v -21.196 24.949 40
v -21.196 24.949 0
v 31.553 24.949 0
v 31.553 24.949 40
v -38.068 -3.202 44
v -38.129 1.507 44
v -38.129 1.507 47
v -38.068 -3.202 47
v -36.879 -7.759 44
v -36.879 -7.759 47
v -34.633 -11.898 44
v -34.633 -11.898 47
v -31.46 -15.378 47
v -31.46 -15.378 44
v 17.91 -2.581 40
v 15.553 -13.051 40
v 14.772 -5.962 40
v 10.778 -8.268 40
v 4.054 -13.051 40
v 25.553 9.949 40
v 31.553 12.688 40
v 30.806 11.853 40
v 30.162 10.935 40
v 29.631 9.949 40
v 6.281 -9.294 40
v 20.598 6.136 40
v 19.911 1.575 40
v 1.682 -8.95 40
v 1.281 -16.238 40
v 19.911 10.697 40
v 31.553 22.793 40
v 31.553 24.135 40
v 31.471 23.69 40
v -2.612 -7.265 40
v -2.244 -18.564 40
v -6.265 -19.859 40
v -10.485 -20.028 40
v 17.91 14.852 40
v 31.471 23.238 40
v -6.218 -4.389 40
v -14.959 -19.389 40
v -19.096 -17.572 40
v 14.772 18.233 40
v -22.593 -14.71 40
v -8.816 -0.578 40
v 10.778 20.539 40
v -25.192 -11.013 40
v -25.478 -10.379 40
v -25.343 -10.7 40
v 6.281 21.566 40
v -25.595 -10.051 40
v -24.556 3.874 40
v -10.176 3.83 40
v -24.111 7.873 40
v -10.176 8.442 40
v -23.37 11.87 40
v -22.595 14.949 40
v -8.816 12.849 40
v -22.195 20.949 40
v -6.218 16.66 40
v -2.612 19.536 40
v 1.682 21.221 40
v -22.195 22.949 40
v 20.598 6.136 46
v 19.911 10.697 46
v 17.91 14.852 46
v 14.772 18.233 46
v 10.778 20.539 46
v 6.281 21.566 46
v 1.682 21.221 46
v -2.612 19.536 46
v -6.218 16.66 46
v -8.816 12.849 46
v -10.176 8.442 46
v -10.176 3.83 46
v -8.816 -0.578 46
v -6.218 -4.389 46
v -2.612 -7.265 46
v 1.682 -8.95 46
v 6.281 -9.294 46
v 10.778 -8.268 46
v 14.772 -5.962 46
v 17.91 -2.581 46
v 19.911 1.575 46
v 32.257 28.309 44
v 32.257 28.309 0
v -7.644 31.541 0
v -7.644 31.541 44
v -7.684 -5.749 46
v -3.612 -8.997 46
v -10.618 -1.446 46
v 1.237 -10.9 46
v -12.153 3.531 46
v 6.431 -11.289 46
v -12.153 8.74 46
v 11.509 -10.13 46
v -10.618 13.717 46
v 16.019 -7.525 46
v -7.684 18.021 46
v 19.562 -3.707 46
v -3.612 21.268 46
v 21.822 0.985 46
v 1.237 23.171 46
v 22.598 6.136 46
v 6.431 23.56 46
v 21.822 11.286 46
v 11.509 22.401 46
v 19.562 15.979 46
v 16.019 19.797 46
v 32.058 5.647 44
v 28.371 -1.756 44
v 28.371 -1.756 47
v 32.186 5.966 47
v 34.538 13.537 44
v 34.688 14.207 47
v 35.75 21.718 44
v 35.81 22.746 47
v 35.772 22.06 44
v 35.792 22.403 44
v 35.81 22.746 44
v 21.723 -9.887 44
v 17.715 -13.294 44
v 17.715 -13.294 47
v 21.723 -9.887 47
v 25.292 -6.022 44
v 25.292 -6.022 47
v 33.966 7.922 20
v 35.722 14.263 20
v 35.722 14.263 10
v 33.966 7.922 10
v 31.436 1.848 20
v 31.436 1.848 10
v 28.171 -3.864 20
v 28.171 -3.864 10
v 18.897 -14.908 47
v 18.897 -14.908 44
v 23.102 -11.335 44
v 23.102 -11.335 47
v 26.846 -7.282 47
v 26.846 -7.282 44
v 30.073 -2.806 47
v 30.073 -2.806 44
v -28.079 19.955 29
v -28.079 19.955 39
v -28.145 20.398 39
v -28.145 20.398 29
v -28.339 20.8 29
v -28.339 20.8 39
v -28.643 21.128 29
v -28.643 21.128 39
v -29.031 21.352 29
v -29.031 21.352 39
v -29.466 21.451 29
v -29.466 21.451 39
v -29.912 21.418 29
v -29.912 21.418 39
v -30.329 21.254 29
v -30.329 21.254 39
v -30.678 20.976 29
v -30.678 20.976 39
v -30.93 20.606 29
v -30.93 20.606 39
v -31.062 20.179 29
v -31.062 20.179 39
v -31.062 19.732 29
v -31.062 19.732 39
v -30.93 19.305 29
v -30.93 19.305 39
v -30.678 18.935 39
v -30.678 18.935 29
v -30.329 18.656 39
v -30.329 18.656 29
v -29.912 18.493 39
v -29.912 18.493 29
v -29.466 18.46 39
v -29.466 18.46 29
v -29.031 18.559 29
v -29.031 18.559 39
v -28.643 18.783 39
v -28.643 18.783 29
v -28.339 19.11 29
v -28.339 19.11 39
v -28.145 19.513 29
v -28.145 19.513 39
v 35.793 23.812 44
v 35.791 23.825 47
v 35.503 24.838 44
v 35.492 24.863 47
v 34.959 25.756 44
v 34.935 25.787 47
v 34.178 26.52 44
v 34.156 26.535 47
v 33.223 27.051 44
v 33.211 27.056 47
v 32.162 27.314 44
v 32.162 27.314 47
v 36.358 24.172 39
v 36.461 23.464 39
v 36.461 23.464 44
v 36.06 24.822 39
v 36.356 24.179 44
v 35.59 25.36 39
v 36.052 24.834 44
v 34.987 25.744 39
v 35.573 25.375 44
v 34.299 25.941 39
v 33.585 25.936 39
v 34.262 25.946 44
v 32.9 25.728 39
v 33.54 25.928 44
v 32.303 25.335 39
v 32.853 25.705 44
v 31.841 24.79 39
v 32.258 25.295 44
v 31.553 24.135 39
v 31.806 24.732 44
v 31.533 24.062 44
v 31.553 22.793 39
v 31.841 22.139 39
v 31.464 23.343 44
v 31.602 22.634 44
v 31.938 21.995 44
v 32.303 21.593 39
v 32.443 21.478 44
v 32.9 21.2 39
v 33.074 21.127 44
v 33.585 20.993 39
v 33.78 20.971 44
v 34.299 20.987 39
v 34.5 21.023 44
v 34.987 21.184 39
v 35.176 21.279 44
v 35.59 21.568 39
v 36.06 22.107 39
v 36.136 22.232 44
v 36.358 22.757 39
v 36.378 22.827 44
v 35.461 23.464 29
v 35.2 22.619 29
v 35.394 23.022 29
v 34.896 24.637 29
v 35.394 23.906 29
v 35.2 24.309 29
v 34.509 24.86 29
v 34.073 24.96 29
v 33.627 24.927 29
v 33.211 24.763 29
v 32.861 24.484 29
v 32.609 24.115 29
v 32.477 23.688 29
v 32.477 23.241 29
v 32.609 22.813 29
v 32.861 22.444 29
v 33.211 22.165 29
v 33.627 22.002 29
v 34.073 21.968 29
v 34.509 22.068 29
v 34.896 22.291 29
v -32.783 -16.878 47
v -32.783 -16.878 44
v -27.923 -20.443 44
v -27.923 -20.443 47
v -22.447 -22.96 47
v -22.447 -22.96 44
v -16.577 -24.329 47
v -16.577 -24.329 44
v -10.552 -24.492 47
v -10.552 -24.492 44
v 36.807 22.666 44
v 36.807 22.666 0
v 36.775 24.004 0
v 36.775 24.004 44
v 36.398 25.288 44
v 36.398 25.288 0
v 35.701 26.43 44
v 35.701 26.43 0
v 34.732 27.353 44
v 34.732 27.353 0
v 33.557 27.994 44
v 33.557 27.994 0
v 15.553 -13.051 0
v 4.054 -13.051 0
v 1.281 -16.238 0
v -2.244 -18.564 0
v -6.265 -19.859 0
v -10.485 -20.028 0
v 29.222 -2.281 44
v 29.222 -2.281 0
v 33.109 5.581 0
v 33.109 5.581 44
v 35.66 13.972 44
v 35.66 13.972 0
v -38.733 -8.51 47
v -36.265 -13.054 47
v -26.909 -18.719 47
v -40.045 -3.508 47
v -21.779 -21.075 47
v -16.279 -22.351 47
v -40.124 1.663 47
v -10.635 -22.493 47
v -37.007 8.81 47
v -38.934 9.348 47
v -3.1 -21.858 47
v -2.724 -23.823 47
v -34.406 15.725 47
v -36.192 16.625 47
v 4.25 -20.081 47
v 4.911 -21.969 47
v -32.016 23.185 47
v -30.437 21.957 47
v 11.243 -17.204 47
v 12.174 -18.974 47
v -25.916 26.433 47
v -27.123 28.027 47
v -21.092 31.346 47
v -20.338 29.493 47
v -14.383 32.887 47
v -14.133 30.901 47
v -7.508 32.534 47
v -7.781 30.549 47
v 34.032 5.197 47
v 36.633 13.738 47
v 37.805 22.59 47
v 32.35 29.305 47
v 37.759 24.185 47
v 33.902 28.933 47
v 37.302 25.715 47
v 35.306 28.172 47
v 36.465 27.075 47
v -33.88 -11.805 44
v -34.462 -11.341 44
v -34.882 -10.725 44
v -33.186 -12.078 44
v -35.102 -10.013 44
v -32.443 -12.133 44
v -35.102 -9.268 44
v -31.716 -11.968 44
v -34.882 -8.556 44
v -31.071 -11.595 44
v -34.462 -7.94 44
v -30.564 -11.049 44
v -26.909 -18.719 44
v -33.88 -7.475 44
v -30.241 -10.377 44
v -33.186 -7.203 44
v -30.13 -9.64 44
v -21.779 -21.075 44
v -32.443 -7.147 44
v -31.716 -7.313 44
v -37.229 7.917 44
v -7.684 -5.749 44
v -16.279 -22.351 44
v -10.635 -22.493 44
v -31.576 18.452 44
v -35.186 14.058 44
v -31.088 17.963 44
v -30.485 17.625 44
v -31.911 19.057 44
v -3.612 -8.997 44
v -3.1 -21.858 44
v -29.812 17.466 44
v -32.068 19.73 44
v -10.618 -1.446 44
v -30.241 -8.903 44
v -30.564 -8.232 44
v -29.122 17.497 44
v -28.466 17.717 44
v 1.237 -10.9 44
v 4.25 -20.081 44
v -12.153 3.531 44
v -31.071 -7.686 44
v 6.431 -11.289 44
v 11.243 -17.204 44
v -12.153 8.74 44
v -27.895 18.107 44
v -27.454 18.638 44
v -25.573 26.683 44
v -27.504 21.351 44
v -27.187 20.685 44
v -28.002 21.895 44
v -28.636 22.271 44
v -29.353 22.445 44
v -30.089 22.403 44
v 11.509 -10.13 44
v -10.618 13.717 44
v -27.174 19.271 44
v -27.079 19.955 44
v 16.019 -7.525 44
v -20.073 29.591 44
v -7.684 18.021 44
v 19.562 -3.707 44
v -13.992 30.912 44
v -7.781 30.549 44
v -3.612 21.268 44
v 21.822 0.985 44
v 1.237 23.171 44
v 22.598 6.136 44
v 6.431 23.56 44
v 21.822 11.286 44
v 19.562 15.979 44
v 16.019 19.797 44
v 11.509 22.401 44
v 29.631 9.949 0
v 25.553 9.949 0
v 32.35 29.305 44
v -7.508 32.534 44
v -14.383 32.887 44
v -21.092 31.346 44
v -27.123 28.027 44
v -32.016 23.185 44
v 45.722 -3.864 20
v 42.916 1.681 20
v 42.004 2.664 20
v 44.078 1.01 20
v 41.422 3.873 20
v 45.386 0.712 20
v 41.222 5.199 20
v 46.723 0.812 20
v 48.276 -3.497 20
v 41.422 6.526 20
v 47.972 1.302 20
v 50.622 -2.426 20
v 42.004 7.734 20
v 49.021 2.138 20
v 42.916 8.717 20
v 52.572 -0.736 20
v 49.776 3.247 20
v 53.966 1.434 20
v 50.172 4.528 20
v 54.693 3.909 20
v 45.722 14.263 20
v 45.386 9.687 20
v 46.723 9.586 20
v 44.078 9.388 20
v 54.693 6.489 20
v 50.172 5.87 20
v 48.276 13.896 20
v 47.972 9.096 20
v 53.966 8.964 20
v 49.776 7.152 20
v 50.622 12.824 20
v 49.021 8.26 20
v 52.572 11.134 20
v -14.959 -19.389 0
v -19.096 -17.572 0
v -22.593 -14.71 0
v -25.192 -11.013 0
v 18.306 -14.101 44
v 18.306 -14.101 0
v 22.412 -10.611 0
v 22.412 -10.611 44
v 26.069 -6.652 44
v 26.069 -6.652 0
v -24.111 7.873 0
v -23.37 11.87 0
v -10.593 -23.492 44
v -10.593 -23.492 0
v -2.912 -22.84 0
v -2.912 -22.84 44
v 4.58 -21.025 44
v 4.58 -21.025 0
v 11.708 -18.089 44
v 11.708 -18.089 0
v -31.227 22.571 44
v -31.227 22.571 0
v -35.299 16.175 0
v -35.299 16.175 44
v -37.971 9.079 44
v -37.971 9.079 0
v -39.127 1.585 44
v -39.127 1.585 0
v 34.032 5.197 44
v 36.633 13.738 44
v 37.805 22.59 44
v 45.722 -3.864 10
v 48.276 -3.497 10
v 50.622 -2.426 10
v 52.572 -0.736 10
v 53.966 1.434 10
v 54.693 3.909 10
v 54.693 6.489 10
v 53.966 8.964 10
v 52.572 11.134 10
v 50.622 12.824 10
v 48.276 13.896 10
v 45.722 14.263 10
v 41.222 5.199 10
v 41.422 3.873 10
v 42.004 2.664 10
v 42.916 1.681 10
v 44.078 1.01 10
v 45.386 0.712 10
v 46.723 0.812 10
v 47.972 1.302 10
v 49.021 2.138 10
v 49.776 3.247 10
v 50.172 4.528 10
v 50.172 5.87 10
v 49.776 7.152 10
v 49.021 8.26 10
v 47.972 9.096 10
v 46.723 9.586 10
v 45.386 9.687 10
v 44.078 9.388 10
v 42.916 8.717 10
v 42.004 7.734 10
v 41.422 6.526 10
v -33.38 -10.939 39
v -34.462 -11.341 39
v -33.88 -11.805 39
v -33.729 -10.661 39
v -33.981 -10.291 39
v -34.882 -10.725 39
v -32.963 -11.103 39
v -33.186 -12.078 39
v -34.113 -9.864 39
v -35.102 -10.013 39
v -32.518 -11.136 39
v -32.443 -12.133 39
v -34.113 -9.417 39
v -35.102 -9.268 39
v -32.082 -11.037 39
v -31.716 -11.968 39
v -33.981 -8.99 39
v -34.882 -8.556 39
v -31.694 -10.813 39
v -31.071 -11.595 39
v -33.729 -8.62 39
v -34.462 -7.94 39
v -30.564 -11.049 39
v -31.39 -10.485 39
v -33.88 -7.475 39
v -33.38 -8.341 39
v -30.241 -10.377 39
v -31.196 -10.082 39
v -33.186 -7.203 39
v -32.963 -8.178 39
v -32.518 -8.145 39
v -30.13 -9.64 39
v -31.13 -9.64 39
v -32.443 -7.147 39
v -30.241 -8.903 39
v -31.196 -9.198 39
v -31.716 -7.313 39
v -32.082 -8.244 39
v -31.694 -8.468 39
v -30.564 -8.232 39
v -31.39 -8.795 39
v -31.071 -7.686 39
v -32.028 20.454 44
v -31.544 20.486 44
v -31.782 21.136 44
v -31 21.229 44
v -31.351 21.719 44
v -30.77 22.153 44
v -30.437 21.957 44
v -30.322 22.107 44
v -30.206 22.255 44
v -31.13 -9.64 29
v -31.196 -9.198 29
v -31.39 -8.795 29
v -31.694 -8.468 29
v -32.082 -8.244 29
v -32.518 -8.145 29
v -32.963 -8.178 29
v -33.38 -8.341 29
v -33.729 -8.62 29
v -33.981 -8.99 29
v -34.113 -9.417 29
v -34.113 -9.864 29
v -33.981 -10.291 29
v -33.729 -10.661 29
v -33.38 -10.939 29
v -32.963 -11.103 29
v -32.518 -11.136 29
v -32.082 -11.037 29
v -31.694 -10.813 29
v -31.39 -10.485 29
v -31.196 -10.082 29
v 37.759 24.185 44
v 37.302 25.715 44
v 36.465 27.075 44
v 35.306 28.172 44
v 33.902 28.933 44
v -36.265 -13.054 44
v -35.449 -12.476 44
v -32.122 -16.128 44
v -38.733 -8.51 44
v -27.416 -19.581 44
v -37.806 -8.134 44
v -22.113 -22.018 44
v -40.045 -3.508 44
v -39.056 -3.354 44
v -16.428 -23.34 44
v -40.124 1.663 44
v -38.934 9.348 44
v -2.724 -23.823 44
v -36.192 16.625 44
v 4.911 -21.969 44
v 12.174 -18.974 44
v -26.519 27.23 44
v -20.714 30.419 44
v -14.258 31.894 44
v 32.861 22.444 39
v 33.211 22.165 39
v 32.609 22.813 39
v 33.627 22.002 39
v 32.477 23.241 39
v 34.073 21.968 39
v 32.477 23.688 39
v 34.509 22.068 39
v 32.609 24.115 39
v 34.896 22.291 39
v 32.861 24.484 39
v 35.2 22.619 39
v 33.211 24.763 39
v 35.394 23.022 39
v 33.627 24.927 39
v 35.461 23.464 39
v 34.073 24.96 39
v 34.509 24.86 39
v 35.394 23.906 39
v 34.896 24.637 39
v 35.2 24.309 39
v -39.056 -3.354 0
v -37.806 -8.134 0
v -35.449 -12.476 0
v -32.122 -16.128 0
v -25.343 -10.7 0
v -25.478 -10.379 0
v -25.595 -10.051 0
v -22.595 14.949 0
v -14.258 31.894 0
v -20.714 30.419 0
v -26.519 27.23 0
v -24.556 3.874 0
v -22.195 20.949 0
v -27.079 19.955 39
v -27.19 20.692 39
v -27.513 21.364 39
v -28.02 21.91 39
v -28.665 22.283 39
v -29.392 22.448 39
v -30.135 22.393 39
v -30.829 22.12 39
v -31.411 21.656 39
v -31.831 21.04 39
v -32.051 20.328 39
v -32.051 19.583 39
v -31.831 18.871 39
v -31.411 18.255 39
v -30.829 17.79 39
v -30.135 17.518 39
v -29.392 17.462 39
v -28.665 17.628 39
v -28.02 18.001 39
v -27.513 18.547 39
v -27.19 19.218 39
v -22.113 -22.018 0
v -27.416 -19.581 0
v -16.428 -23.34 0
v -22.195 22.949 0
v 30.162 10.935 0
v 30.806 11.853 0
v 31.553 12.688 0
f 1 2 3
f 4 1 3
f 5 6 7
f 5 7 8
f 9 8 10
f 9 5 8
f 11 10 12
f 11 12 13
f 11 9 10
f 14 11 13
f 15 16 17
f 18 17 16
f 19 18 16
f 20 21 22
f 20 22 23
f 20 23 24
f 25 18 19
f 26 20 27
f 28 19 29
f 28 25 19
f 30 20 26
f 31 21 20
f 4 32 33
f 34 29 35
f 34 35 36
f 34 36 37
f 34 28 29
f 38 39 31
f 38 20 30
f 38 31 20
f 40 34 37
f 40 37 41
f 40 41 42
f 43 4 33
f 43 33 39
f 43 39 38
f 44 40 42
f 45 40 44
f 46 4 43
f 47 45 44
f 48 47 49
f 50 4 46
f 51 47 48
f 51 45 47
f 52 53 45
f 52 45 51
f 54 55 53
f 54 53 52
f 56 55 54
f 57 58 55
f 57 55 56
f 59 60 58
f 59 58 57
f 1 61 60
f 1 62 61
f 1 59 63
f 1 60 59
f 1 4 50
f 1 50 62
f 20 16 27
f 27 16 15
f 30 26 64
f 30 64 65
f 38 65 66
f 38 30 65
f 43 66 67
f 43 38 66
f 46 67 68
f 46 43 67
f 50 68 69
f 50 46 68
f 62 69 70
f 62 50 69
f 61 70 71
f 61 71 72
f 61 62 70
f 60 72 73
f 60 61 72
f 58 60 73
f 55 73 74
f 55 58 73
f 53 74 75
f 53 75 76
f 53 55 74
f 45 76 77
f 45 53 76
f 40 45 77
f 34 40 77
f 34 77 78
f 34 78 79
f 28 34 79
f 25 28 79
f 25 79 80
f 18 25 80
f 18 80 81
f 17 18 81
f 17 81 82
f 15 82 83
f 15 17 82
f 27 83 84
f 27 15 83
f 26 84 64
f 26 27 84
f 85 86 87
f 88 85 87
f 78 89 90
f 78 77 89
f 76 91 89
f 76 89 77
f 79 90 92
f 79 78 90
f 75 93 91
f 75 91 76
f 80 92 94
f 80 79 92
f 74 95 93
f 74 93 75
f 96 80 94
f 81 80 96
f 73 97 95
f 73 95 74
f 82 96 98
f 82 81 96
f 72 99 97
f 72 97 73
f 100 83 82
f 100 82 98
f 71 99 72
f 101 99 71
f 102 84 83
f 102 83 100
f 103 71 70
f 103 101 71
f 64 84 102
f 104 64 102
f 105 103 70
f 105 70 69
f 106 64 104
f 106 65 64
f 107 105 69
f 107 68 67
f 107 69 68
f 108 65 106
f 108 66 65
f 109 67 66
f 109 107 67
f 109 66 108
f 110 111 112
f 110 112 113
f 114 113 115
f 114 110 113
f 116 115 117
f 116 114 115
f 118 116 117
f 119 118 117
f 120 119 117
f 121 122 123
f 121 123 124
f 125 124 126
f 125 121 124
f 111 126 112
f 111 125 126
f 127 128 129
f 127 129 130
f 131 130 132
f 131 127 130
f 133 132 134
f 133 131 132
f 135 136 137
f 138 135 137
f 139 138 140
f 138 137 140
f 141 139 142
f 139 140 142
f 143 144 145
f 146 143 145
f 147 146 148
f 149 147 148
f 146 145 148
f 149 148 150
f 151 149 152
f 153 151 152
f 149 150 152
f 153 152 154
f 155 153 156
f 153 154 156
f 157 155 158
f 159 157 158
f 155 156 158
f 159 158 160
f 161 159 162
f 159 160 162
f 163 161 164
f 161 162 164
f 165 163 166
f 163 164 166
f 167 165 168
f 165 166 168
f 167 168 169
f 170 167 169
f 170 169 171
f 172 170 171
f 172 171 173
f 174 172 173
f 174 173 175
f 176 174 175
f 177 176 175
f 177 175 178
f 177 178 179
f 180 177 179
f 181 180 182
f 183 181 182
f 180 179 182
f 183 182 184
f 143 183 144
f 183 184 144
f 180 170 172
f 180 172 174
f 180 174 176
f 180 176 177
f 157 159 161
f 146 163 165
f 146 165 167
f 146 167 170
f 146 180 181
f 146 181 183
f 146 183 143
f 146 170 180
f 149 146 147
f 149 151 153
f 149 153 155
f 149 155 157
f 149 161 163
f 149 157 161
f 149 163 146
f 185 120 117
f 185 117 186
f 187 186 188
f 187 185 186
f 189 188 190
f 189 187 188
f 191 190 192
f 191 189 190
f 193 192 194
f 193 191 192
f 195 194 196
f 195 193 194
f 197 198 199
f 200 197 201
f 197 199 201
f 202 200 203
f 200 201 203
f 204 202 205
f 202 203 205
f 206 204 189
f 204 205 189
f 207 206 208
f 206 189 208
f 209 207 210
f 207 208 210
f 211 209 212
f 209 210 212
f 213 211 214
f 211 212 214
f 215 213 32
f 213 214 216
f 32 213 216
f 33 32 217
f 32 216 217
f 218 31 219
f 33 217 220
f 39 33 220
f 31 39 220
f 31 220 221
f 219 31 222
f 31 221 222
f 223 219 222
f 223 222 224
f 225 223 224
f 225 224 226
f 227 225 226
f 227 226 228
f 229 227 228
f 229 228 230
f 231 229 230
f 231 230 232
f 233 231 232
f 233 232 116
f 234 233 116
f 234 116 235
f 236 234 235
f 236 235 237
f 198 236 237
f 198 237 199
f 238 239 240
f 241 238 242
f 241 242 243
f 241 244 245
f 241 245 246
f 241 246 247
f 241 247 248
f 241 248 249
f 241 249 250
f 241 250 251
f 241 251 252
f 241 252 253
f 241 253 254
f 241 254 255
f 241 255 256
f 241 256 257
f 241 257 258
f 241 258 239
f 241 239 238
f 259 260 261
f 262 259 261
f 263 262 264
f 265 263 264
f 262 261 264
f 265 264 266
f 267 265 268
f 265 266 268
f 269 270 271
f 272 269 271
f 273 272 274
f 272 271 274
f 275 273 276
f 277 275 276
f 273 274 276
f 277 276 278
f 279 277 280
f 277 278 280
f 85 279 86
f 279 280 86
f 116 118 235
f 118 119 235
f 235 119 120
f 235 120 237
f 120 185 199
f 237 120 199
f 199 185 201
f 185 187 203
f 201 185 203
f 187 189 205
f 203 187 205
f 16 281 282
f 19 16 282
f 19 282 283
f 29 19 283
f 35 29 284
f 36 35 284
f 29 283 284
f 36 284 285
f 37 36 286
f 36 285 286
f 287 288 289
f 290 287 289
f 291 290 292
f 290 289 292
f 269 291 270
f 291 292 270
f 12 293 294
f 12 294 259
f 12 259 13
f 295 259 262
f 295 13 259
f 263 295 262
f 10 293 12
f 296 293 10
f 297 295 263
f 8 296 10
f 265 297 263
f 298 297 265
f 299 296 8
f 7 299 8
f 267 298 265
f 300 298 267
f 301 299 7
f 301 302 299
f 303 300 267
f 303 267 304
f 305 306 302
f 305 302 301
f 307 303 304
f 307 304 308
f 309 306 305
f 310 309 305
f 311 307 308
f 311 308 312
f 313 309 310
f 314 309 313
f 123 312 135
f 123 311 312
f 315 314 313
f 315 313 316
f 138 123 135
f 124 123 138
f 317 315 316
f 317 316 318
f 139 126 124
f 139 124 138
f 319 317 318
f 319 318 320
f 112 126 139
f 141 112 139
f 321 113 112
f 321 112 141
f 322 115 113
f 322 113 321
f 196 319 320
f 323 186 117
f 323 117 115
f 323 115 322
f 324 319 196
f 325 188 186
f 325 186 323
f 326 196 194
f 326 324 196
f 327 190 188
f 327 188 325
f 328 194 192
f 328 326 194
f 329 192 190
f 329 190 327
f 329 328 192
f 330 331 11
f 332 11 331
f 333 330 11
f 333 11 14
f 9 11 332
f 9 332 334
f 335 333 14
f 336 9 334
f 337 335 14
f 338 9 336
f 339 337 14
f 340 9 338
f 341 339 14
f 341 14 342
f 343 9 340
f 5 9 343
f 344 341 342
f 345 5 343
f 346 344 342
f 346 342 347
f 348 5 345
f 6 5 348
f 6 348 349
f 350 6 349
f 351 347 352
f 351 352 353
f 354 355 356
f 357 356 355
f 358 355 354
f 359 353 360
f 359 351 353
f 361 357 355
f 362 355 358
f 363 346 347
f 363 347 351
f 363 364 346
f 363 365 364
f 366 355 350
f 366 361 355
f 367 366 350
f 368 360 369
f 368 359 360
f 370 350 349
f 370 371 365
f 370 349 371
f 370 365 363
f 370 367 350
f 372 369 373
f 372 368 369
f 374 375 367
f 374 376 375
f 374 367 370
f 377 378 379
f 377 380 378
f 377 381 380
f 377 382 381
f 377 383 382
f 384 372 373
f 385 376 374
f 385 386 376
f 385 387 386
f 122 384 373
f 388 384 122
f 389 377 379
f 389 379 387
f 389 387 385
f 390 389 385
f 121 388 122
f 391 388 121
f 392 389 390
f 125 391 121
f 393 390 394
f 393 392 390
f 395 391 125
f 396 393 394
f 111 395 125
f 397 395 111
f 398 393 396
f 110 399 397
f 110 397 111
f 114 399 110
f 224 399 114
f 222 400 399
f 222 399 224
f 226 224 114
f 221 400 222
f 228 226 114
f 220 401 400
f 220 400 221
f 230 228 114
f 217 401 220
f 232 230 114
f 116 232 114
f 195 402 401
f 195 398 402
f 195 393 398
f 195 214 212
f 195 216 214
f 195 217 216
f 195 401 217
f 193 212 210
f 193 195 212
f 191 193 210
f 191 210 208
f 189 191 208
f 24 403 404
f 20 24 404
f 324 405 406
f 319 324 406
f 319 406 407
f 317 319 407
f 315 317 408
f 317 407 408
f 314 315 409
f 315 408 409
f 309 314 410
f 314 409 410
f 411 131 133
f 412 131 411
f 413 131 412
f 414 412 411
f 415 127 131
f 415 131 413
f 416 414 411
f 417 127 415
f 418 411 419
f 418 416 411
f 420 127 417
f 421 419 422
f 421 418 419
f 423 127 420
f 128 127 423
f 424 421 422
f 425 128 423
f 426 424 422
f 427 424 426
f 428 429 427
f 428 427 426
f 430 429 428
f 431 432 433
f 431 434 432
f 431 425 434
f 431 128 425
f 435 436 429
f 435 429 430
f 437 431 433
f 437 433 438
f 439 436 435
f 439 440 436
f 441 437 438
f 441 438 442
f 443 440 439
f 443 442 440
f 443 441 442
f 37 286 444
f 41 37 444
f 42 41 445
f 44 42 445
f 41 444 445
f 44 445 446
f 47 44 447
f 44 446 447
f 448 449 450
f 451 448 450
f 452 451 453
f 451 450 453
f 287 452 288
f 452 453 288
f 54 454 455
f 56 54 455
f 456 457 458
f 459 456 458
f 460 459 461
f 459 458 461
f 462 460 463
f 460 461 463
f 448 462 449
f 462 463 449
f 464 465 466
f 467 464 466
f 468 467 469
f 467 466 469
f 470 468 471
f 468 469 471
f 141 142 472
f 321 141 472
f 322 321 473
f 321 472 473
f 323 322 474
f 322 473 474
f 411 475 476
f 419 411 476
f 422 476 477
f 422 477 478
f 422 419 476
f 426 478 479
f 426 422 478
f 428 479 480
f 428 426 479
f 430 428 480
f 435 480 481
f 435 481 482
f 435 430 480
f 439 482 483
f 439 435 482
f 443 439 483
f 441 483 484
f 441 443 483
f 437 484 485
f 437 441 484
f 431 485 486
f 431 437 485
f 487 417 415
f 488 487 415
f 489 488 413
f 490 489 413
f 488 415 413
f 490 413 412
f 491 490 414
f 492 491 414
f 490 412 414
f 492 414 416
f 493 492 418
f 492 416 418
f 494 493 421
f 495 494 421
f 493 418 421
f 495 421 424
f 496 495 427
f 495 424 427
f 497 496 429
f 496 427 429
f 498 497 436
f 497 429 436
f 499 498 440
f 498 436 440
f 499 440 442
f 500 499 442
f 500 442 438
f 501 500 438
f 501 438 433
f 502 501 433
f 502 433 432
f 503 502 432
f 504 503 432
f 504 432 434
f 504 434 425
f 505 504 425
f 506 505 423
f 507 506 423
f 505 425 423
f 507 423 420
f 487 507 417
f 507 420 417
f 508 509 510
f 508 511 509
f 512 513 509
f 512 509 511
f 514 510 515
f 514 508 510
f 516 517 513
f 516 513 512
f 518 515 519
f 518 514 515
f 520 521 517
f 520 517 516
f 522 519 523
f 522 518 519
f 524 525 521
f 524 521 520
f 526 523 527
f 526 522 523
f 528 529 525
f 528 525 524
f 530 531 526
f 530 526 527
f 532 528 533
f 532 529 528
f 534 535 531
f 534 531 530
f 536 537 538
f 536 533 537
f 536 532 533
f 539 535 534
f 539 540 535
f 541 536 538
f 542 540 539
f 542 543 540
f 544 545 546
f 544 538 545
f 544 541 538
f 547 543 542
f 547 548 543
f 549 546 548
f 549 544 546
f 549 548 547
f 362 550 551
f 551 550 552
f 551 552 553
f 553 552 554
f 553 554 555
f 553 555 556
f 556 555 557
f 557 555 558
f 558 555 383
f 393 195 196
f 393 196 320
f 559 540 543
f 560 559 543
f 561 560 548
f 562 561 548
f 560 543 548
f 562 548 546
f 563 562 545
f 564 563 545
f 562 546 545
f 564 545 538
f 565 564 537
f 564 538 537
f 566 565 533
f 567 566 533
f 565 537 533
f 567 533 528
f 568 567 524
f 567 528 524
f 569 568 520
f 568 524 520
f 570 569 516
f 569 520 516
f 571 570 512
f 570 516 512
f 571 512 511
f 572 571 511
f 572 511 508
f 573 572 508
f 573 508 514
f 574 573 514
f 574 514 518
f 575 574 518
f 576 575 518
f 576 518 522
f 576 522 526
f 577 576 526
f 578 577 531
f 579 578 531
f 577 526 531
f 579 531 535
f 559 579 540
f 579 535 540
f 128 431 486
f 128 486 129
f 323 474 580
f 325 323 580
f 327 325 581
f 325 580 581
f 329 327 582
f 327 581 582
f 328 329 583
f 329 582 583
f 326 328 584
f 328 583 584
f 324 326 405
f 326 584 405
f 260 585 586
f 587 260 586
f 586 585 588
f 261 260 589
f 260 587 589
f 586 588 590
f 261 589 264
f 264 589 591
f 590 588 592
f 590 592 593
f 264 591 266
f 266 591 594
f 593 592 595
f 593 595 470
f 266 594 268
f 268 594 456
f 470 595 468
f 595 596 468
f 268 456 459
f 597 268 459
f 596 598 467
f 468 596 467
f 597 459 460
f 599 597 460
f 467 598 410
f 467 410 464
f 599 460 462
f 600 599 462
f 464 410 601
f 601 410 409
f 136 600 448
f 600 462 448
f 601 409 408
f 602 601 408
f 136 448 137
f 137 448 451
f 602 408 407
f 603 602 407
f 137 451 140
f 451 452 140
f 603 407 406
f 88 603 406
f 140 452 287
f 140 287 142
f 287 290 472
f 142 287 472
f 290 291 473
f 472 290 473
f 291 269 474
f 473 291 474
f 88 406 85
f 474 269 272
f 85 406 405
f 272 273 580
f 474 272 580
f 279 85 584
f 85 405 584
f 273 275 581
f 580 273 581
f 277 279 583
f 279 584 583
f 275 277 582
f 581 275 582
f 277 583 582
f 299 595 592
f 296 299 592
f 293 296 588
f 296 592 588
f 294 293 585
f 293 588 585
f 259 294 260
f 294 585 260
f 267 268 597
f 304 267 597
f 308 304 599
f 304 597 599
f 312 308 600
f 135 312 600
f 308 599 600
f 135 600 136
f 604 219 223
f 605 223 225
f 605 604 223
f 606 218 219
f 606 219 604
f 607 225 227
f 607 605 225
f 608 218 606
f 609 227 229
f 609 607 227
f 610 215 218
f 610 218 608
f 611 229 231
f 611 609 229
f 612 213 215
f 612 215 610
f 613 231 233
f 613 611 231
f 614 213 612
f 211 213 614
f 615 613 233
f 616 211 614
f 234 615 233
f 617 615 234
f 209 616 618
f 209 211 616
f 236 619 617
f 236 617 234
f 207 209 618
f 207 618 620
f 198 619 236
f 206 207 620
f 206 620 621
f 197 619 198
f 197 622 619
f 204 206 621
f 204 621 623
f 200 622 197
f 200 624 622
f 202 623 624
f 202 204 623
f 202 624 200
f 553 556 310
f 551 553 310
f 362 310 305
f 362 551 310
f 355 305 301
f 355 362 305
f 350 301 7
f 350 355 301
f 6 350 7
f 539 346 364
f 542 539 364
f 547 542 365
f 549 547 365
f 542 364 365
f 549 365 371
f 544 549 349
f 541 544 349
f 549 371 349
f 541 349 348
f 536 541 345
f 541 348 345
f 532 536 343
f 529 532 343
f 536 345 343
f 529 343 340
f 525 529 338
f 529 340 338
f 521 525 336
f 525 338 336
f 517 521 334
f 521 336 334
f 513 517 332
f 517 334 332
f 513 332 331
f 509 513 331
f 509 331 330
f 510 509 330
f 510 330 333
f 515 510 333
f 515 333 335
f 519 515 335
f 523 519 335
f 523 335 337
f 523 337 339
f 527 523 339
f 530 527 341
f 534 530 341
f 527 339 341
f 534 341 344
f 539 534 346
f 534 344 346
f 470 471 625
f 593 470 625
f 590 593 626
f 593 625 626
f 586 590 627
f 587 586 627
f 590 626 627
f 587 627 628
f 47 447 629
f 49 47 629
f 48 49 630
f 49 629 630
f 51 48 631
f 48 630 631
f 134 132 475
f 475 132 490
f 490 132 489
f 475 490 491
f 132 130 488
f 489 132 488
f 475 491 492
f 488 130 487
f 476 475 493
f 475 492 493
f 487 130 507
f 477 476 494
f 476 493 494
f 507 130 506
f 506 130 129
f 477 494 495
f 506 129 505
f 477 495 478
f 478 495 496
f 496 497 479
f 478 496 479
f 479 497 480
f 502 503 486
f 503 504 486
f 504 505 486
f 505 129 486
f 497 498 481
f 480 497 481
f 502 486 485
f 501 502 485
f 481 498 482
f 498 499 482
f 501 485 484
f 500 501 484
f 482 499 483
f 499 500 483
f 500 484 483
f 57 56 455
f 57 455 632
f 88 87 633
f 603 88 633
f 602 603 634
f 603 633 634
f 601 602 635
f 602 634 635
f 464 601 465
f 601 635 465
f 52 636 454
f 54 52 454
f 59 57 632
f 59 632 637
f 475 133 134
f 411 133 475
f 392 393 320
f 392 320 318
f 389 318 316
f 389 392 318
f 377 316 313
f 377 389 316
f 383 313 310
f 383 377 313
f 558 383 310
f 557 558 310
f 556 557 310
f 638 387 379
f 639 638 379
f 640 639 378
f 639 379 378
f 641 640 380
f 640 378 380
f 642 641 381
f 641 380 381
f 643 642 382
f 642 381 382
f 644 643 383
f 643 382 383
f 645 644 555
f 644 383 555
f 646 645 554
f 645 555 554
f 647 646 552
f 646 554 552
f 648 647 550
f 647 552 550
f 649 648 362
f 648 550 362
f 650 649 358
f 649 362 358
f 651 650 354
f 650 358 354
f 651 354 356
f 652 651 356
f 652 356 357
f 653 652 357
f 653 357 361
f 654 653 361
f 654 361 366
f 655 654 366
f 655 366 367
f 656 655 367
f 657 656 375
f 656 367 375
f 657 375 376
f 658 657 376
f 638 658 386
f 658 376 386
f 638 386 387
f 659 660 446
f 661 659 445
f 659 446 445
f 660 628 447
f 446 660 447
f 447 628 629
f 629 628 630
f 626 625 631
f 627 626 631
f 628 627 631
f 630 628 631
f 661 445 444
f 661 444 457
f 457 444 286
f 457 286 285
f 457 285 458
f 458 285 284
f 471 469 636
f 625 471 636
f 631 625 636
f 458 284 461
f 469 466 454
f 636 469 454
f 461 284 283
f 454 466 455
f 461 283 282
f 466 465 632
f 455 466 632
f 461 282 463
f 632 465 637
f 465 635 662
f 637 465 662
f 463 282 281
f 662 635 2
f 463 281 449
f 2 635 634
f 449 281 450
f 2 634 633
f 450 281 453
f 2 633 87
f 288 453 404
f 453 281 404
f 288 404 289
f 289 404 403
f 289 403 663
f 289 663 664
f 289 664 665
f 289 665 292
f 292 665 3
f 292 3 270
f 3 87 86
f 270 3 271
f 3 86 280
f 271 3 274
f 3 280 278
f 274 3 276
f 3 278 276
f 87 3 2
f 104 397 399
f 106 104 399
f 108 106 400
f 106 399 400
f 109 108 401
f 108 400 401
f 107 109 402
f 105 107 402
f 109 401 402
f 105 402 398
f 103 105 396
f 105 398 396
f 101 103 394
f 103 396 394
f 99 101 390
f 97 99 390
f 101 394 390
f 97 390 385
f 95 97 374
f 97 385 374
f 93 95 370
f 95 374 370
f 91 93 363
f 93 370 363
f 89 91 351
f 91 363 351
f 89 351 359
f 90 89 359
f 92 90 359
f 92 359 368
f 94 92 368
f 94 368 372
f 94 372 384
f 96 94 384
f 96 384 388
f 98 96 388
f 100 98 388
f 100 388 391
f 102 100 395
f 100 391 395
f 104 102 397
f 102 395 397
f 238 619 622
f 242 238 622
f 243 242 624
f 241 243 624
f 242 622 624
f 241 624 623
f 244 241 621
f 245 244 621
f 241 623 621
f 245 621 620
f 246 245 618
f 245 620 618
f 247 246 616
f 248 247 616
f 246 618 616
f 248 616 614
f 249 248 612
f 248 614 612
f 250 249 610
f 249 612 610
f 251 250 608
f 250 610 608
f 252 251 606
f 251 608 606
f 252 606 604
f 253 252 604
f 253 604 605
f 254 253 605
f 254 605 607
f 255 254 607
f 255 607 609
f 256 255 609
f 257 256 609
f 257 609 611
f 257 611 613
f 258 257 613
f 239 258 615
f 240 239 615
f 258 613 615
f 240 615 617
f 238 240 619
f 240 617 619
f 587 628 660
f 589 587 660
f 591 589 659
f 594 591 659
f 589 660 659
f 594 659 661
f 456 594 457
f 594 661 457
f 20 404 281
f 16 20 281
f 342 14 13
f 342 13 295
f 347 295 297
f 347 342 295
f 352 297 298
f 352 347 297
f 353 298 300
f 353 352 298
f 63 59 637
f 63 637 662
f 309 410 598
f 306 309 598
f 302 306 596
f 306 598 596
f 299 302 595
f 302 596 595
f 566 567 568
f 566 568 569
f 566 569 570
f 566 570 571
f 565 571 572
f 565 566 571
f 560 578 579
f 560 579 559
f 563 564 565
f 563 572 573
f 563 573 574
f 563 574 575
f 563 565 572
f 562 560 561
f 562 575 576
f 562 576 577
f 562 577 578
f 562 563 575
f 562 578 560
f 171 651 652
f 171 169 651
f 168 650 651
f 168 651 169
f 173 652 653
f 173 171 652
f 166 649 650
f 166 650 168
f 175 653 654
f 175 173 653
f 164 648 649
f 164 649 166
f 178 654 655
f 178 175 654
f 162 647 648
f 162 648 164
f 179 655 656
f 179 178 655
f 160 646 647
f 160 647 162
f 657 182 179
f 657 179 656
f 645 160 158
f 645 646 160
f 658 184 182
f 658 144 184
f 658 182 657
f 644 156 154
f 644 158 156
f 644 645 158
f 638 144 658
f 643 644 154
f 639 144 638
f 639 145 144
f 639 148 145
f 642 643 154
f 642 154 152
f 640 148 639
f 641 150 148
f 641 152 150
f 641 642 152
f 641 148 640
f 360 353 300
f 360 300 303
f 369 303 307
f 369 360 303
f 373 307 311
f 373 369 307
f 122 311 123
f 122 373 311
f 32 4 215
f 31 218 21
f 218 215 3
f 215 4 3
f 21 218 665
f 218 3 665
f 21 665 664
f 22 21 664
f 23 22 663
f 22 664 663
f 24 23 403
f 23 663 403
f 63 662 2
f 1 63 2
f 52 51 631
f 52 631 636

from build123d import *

# Parameters (mm, degrees)
SKETCH5_R           = 15.473305228
BOSS_EXTRUDE2_DEPTH = 44
SKETCH12_R          = 17.473305228
SKETCH12_R_2        = 15.473305228
EXTRUDE_THIN3_DEPTH = 2
CUT_EXTRUDE1_DEPTH  = 40
SKETCH20_R          = 2.5
CUT_EXTRUDE4_DEPTH  = 5
SKETCH21_R          = 1.5
CUT_EXTRUDE5_DEPTH  = 10
EXTRUDE_THIN4_DEPTH = 3
SKETCH25_R          = 9.063523101
SKETCH25_R_2        = 4.5
BOSS_EXTRUDE4_DEPTH = 10
BOSS_EXTRUDE5_DEPTH = 10


with BuildPart() as part:
    # Sketch5 → Boss-Extrude2 (new body)
    with BuildSketch(Plane.XY):
        with BuildLine():
            Line((32.256739142, 28.309407593), (-7.64388079, 31.541344196))
            ThreePointArc((-7.64388079, 31.541344196), (-20.714496622, 30.419301273), (-31.22672033, 22.571172119))
            ThreePointArc((-31.22672033, 22.571172119), (-36.818780536, 12.696442206), (-39.126744744, 1.585423828))
            ThreePointArc((-39.126744744, 1.585423828), (-37.806199642, -8.134094121), (-32.121617791, -16.127741455))
            ThreePointArc((-32.121617791, -16.127741455), (-22.11279616, -22.017790129), (-10.593480584, -23.492426514))
            ThreePointArc((-10.593480584, -23.492426514), (4.580349487, -21.025233446), (18.305750373, -14.10096228))
            ThreePointArc((18.305750373, -14.10096228), (24.300474949, -8.686492062), (29.222071174, -2.280939697))
            ThreePointArc((29.222071174, -2.280939697), (34.556349639, 9.723965473), (36.807215217, 22.666371704))
            ThreePointArc((36.807215217, 22.666371704), (35.700688178, 26.430324101), (32.256739142, 28.309407593))
        make_face()
        with Locations((5.124956693, 6.135695376)):
            Circle(SKETCH5_R, mode=Mode.SUBTRACT)
    extrude(amount=BOSS_EXTRUDE2_DEPTH)

    # Sketch12 → Extrude-Thin3 (add)
    with BuildSketch(Plane.XY.offset(44)):
        with Locations((5.124956693, 6.135695376)):
            Circle(SKETCH12_R)
        with Locations((5.124956693, 6.135695376)):
            Circle(SKETCH12_R_2, mode=Mode.SUBTRACT)
    extrude(amount=EXTRUDE_THIN3_DEPTH)

    # Sketch16 → Cut-Extrude1 (cut)
    with BuildSketch(Plane(origin=(0, 0, 0), x_dir=(-1, 0, 0), z_dir=(0, 0, -1))):
        with BuildLine():
            Line((22.195471785, 22.948681705), (21.19553282, 24.948682404))
            Line((21.19553282, 24.948682404), (-31.552515336, 24.948682404))
            Line((-31.552515336, 24.948682404), (-31.552515336, 12.688177276))
            ThreePointArc((-31.552515336, 12.688177276), (-30.470262259, 11.403706176), (-29.631188371, 9.948682897))
            Line((-29.631188371, 9.948682897), (-25.55269716, 9.948682897))
            Line((-25.55269716, 9.948682897), (-15.553124406, -13.051317103))
            Line((-15.553124406, -13.051317103), (-4.053551652, -13.051317103))
            ThreePointArc((-4.053551652, -13.051317103), (2.244172832, -18.564410088), (10.485205672, -20.0275935))
            ThreePointArc((10.485205672, -20.0275935), (19.095948524, -17.571925714), (25.191809676, -11.0132922))
            ThreePointArc((25.191809676, -11.0132922), (25.412735131, -10.540335552), (25.595374129, -10.051317103))
            Line((25.595374129, -10.051317103), (24.555518172, 3.874317282))
            Line((24.555518172, 3.874317282), (24.111182234, 7.873233908))
            Line((24.111182234, 7.873233908), (23.369788191, 11.870123022))
            Line((23.369788191, 11.870123022), (22.595496199, 14.948681944))
            Line((22.595496199, 14.948681944), (22.195471785, 20.94868409))
            Line((22.195471785, 20.94868409), (22.195471785, 22.948681705))
        make_face()
    extrude(amount=-CUT_EXTRUDE1_DEPTH, mode=Mode.SUBTRACT)

    # Sketch20 → Cut-Extrude4 (cut)
    with BuildSketch(Plane.XY.offset(44)):
        with Locations((33.960691328, 23.464138043)):
            Circle(SKETCH20_R)
        with Locations((-29.578532791, 19.955369365)):
            Circle(SKETCH20_R)
        with Locations((-32.62963599, -9.640331665)):
            Circle(SKETCH20_R)
    extrude(amount=-CUT_EXTRUDE4_DEPTH, mode=Mode.SUBTRACT)

    # Sketch21 → Cut-Extrude5 (cut)
    with BuildSketch(Plane.XY.offset(39)):
        with Locations((33.960691328, 23.464138043)):
            Circle(SKETCH21_R)
        with Locations((-29.578532791, 19.955369365)):
            Circle(SKETCH21_R)
        with Locations((-32.62963599, -9.640331665)):
            Circle(SKETCH21_R)
    extrude(amount=-CUT_EXTRUDE5_DEPTH, mode=Mode.SUBTRACT)

    # Sketch22 → Extrude-Thin4 (add)
    with BuildSketch(Plane.XY.offset(44)):
        with BuildLine():
            ThreePointArc((37.804637591, 22.589570952), (36.465446402, 27.074948387), (32.349832306, 29.305142187))
            Line((32.349832306, 29.305142187), (-7.508152433, 32.533625355))
            ThreePointArc((-7.508152433, 32.533625355), (-21.0919102, 31.345630531), (-32.016062598, 23.185195421))
            ThreePointArc((-32.016062598, 23.185195421), (-37.751325392, 13.057617284), (-40.124101539, 1.663276075))
            ThreePointArc((-40.124101539, 1.663276075), (-38.732987991, -8.509770105), (-32.783055883, -16.877826833))
            ThreePointArc((-32.783055883, -16.877826833), (-22.446887925, -22.960392779), (-10.552022778, -24.492110653))
            ThreePointArc((-10.552022778, -24.492110653), (4.910897112, -21.969287876), (18.896663991, -14.907783002))
            ThreePointArc((18.896663991, -14.907783002), (25.035055299, -9.365013776), (30.073165065, -2.806081812))
            ThreePointArc((30.073165065, -2.806081812), (35.507374746, 9.414237288), (37.804637591, 22.589570952))
        make_face()
        with BuildLine():
            ThreePointArc((35.809903928, 22.745746473), (34.934653853, 25.78714501), (32.162368837, 27.313776446))
            Line((32.162368837, 27.313776446), (-7.780775078, 30.549157478))
            ThreePointArc((-7.780775078, 30.549157478), (-20.337586242, 29.492756605), (-30.437333452, 21.957201169))
            ThreePointArc((-30.437333452, 21.957201169), (-35.886275494, 12.335154333), (-38.129381097, 1.507262942))
            ThreePointArc((-38.129381097, 1.507262942), (-36.879366836, -7.758521051), (-31.460237604, -15.377597571))
            ThreePointArc((-31.460237604, -15.377597571), (-21.778858305, -21.07513046), (-10.635186571, -22.492722237))
            ThreePointArc((-10.635186571, -22.492722237), (4.249673531, -20.08121001), (17.714822717, -13.294148135))
            ThreePointArc((17.714822717, -13.294148135), (23.565896834, -8.007967929), (28.370986318, -1.755777548))
            ThreePointArc((28.370986318, -1.755777548), (33.605695031, 10.034938826), (35.809903928, 22.745746473))
        make_face(mode=Mode.SUBTRACT)
    extrude(amount=EXTRUDE_THIN4_DEPTH)


with BuildPart() as body_2:
    # Sketch25 → Boss-Extrude4 (new body)
    with BuildSketch(Plane.XY.offset(20)):
        with Locations(Location((45.722016575, 5.199127346, 0), (0, 0, 180))):
            Circle(SKETCH25_R)
        with Locations(Location((45.722016575, 5.199127346, 0), (0, 0, 180))):
            Circle(SKETCH25_R_2, mode=Mode.SUBTRACT)
    extrude(amount=-BOSS_EXTRUDE4_DEPTH)

    # Sketch26 → Boss-Extrude5 (add)
    with BuildSketch(Plane.XY.offset(20)):
        with BuildLine():
            Line((45.722016575, 14.262650447), (35.722016575, 14.262650447))
            ThreePointArc((35.722016575, 14.262650447), (32.795294741, 4.845637931), (28.17132041, -3.864395755))
            Line((28.17132041, -3.864395755), (45.722016575, -3.864395755))
            ThreePointArc((45.722016575, -3.864395755), (36.658493473, 5.199127346), (45.722016575, 14.262650447))
        make_face()
    extrude(amount=-BOSS_EXTRUDE5_DEPTH)


solid = Compound([part.part, body_2.part])
